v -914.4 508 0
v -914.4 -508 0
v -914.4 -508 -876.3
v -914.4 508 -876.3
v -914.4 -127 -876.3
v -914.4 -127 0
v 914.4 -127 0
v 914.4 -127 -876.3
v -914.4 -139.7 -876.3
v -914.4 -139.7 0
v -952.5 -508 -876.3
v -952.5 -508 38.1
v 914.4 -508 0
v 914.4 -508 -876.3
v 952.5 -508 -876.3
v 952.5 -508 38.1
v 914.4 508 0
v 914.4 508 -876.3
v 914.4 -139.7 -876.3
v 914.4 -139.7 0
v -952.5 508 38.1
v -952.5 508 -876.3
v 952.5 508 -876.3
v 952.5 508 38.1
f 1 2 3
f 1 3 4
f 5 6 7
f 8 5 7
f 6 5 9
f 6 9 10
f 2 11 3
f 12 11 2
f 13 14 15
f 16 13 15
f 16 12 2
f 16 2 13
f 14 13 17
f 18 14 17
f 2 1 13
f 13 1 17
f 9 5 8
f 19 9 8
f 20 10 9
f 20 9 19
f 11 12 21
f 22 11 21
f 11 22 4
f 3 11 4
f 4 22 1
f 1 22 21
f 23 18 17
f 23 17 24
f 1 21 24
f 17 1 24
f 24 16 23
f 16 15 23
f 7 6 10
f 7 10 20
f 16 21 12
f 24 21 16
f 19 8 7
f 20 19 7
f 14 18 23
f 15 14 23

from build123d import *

# Parameters (mm, degrees)
F0_W     = 38.1
F0_H     = 1016
F0_W_2   = 1828.8
F1_DEPTH = 38.1
F2_DEPTH = 876.3
F4_W     = 1828.8
F4_H     = 876.3
F5_DEPTH = 12.7


with BuildPart() as f1:
    # F0 (on Top) → F1 (new body)
    with BuildSketch(Plane.XY):
        with Locations((-933.45, 0)):
            Rectangle(F0_W, F0_H)
        Rectangle(F0_W_2, F0_H)
        with Locations((933.45, 0)):
            Rectangle(F0_W, F0_H)
    extrude(amount=F1_DEPTH)

    # F0 (on Top) → F2 (join)
    with BuildSketch(Plane.XY):
        with Locations((-933.45, 0)):
            Rectangle(F0_W, F0_H)
        with Locations((933.45, 0)):
            Rectangle(F0_W, F0_H)
    extrude(amount=-F2_DEPTH)


with BuildPart() as f5:
    # F4 (on offset) → F5 (new body)
    with BuildSketch(Plane.XZ.offset(127)):
        with Locations((0, -438.15)):
            Rectangle(F4_W, F4_H)
    extrude(amount=F5_DEPTH)


solid = Compound([f1.part, f5.part])
